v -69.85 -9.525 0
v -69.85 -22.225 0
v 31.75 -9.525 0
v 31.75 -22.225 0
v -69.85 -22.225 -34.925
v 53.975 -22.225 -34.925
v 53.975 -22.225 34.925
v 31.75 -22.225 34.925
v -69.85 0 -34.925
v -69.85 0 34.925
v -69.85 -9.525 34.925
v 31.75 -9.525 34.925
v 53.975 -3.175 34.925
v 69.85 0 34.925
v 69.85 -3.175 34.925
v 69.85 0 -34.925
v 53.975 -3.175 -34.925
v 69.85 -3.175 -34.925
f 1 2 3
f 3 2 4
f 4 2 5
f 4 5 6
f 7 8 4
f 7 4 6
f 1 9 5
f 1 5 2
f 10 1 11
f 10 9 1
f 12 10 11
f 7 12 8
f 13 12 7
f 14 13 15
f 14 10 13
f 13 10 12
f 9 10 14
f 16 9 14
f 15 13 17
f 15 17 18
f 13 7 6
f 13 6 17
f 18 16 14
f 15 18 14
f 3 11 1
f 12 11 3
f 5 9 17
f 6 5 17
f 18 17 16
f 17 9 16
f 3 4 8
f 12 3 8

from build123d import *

# Parameters (mm, degrees)
F0_W     = 139.7
F0_H     = 69.85
F1_DEPTH = 22.225
F2_W     = 101.6
F2_H     = 34.925
F3_DEPTH = 12.7
F4_W     = 15.875
F4_H     = 19.05
F5_DEPTH = 127


with BuildPart() as f1:
    # F0 (on Front) → F1 (new body)
    with BuildSketch(Plane.XZ):
        Rectangle(F0_W, F0_H)
    extrude(amount=F1_DEPTH)

    # F2 (on face) → F3 (cut)
    with BuildSketch(Plane.XZ.offset(22.225)):
        with Locations((-19.05, 17.4625)):
            Rectangle(F2_W, F2_H)
    extrude(amount=-F3_DEPTH, mode=Mode.SUBTRACT)

    # F4 (on face) → F5 (cut)
    with BuildSketch(Plane.XY.offset(34.925)):
        with Locations((61.9125, -12.7)):
            Rectangle(F4_W, F4_H)
    extrude(amount=-F5_DEPTH, mode=Mode.SUBTRACT)


solid = f1.part
